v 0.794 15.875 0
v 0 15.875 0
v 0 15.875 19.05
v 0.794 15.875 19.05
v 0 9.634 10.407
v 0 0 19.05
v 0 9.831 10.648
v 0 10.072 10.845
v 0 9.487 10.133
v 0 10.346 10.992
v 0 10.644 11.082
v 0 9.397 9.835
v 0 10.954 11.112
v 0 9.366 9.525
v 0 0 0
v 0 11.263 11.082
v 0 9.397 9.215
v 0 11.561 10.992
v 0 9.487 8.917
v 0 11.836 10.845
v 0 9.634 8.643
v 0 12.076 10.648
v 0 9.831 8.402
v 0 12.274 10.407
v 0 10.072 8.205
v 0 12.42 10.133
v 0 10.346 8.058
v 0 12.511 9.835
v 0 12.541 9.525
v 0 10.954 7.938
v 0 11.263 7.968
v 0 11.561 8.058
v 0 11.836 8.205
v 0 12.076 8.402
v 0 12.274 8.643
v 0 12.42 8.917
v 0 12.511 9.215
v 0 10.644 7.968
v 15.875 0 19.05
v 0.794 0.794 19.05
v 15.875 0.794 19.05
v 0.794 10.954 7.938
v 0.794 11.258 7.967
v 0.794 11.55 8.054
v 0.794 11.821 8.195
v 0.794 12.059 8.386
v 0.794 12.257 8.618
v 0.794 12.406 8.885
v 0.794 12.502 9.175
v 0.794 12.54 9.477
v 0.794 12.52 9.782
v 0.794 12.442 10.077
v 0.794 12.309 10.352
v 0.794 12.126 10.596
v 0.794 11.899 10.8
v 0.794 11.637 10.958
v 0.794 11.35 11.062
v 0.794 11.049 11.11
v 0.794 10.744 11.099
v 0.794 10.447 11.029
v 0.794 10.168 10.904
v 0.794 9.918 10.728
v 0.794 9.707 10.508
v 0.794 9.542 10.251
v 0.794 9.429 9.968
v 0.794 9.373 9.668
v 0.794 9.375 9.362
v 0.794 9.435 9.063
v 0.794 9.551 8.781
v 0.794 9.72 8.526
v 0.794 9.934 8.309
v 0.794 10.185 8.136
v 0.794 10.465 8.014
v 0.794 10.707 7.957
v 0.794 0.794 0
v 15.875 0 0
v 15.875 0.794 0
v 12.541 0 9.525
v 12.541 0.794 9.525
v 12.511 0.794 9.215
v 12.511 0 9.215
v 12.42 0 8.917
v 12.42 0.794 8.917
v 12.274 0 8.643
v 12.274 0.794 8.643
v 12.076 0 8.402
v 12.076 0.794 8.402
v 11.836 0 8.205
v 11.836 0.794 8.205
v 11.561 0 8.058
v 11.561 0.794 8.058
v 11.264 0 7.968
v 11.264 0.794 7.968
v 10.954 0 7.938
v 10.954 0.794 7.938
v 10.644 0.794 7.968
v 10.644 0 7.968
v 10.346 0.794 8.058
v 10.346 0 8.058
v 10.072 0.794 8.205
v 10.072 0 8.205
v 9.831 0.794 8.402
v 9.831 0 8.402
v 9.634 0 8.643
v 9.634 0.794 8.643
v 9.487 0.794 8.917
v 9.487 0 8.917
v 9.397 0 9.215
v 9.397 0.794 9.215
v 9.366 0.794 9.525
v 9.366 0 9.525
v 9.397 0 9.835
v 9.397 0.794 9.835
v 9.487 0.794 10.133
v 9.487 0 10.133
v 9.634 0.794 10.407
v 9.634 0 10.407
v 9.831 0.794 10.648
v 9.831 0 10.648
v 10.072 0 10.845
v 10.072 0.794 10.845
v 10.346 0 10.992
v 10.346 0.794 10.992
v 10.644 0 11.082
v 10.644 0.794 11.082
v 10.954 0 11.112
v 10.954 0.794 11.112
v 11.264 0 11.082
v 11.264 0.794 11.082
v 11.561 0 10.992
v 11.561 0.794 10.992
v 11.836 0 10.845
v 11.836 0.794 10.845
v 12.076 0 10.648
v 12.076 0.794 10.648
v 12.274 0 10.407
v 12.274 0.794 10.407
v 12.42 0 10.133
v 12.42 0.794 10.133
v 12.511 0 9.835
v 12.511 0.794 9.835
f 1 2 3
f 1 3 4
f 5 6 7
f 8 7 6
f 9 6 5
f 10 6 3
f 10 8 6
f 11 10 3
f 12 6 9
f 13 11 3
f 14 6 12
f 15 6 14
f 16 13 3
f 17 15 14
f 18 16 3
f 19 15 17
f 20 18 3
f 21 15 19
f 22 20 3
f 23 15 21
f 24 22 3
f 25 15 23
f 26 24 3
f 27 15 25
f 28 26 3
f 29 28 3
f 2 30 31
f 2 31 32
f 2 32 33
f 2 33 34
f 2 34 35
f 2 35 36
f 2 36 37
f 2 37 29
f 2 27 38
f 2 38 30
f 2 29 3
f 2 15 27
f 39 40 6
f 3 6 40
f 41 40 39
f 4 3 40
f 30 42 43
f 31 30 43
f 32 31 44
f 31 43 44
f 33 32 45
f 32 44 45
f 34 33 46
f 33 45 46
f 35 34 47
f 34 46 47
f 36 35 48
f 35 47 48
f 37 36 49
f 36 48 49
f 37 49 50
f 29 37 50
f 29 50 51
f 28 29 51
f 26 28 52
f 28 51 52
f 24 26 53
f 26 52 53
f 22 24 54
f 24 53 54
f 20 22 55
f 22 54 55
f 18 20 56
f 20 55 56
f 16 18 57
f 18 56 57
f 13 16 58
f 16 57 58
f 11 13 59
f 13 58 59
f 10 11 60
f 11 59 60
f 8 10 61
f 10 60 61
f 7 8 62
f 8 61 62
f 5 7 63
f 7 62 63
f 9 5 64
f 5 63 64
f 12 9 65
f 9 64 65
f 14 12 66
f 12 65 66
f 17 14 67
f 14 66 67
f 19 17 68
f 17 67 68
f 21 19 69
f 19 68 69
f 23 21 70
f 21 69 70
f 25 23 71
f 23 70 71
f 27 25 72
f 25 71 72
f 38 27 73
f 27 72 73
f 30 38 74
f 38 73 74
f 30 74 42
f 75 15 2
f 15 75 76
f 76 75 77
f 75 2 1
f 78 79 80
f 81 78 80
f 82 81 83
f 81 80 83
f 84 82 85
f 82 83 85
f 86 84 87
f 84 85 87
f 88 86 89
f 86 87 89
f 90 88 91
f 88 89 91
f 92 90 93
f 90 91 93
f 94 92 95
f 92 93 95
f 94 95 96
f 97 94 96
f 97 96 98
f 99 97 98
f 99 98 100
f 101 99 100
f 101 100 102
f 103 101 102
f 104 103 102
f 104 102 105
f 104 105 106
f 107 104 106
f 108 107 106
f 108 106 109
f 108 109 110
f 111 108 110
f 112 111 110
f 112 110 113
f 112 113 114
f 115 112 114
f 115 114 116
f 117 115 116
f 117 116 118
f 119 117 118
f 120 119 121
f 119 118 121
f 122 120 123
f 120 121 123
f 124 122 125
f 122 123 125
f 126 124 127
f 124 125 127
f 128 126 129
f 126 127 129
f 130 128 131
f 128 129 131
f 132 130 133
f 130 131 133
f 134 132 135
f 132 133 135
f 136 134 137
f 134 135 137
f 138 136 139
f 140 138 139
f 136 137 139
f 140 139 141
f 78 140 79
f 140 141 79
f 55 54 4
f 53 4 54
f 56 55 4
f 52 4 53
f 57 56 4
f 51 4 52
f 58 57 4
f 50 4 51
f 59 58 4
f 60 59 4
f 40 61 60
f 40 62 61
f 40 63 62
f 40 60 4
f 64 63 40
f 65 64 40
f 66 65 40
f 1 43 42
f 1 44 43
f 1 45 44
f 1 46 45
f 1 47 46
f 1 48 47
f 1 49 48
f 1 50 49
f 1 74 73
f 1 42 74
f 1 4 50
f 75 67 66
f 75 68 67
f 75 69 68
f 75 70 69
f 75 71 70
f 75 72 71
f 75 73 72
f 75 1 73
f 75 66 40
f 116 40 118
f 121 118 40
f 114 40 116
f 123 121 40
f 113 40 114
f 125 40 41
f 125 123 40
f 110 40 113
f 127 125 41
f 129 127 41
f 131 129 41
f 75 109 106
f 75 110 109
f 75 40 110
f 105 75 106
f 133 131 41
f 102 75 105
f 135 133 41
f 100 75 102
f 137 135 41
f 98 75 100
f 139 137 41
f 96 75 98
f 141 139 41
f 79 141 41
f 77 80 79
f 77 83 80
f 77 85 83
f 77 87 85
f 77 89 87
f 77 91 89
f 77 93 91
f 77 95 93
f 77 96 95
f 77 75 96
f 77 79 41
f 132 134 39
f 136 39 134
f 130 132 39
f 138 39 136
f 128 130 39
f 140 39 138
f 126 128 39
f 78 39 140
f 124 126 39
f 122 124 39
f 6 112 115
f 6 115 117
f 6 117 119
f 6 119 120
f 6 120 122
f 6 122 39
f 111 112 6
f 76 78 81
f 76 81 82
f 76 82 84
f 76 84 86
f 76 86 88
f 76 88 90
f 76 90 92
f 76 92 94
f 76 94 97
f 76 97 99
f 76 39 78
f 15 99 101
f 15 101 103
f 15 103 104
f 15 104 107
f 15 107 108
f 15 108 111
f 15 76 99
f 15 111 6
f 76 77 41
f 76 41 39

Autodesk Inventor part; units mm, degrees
ref_plane "YZ Plane" through (0, 0, 0) normal (1, 0, 0) x (0, 1, 0)
ref_plane "XZ Plane" through (0, 0, 0) normal (0, 1, 0) x (-1, 0, 0)
sketch "Sketch1" plane through (0, 0, 0) normal (0, 0, 1) x (1, 0, 0)
  line L0 (0, 0) -> (0, 15.875)
  line L1 (0, 15.875) -> (0.7937, 15.875)
  line L2 (0.7937, 15.875) -> (0.7938, 0.7937)
  line L3 (0.7938, 0.7937) -> (15.875, 0.7937)
  line L4 (15.875, 0.7937) -> (15.875, 0)
  line L5 (15.875, 0) -> (0, 0)
  dimension "d0" = 15.875
  dimension "d1" = 0.7937
  dimension "d11" = 15.875
extrude "Extrusion1" add sketch "Sketch1" along normal blind 19.05
sketch "Sketch2" plane through (0.7938, 0.7937, 0) normal (1, 0, 0) x (0, 0, -1)
  line L0 (0, 15.0812) -> (0, 0) projected
  line L1 (-19.05, 0) -> (-19.05, 15.0812) projected
  circle A0 centre (-9.525, 10.16) radius 1.5875
  line L2 (0, 0) -> (-19.05, 0) projected
  line L3 (-19.05, 10.16) -> (0, 10.16) construction
  point P0 (0, -0.7937)
  dimension "d4" = 3.175
  dimension "d13" = 10.16
sketch "Sketch3" plane through (0.7938, 0.7937, 0) normal (0, 1, 0) x (1, 0, 0)
  line L0 (15.0812, -19.05) -> (0, -19.05) projected
  circle A0 centre (10.16, -9.525) radius 1.5875
  line L1 (0, 0) -> (0, -19.05) projected
  line L2 (10.16, 0) -> (10.16, -19.05) construction
  line L3 (0, 0) -> (15.0812, 0) projected
  point P0 (-0.7938, 0)
  dimension "d5" = 3.175
  dimension "d10" = 10.16
  dimension "d12" = 15.0813
extrude "Extrusion2" cut sketch "Sketch2" against normal through all
extrude "Extrusion3" cut sketch "Sketch3" against normal through all
ref_plane "Work Plane1" through (0, 0, 9.525) normal (0, 0, 1) x (1, 0, 0)
properties part number "Hopper Pail Mounting Brace P13" material "Aluminum 6061"
